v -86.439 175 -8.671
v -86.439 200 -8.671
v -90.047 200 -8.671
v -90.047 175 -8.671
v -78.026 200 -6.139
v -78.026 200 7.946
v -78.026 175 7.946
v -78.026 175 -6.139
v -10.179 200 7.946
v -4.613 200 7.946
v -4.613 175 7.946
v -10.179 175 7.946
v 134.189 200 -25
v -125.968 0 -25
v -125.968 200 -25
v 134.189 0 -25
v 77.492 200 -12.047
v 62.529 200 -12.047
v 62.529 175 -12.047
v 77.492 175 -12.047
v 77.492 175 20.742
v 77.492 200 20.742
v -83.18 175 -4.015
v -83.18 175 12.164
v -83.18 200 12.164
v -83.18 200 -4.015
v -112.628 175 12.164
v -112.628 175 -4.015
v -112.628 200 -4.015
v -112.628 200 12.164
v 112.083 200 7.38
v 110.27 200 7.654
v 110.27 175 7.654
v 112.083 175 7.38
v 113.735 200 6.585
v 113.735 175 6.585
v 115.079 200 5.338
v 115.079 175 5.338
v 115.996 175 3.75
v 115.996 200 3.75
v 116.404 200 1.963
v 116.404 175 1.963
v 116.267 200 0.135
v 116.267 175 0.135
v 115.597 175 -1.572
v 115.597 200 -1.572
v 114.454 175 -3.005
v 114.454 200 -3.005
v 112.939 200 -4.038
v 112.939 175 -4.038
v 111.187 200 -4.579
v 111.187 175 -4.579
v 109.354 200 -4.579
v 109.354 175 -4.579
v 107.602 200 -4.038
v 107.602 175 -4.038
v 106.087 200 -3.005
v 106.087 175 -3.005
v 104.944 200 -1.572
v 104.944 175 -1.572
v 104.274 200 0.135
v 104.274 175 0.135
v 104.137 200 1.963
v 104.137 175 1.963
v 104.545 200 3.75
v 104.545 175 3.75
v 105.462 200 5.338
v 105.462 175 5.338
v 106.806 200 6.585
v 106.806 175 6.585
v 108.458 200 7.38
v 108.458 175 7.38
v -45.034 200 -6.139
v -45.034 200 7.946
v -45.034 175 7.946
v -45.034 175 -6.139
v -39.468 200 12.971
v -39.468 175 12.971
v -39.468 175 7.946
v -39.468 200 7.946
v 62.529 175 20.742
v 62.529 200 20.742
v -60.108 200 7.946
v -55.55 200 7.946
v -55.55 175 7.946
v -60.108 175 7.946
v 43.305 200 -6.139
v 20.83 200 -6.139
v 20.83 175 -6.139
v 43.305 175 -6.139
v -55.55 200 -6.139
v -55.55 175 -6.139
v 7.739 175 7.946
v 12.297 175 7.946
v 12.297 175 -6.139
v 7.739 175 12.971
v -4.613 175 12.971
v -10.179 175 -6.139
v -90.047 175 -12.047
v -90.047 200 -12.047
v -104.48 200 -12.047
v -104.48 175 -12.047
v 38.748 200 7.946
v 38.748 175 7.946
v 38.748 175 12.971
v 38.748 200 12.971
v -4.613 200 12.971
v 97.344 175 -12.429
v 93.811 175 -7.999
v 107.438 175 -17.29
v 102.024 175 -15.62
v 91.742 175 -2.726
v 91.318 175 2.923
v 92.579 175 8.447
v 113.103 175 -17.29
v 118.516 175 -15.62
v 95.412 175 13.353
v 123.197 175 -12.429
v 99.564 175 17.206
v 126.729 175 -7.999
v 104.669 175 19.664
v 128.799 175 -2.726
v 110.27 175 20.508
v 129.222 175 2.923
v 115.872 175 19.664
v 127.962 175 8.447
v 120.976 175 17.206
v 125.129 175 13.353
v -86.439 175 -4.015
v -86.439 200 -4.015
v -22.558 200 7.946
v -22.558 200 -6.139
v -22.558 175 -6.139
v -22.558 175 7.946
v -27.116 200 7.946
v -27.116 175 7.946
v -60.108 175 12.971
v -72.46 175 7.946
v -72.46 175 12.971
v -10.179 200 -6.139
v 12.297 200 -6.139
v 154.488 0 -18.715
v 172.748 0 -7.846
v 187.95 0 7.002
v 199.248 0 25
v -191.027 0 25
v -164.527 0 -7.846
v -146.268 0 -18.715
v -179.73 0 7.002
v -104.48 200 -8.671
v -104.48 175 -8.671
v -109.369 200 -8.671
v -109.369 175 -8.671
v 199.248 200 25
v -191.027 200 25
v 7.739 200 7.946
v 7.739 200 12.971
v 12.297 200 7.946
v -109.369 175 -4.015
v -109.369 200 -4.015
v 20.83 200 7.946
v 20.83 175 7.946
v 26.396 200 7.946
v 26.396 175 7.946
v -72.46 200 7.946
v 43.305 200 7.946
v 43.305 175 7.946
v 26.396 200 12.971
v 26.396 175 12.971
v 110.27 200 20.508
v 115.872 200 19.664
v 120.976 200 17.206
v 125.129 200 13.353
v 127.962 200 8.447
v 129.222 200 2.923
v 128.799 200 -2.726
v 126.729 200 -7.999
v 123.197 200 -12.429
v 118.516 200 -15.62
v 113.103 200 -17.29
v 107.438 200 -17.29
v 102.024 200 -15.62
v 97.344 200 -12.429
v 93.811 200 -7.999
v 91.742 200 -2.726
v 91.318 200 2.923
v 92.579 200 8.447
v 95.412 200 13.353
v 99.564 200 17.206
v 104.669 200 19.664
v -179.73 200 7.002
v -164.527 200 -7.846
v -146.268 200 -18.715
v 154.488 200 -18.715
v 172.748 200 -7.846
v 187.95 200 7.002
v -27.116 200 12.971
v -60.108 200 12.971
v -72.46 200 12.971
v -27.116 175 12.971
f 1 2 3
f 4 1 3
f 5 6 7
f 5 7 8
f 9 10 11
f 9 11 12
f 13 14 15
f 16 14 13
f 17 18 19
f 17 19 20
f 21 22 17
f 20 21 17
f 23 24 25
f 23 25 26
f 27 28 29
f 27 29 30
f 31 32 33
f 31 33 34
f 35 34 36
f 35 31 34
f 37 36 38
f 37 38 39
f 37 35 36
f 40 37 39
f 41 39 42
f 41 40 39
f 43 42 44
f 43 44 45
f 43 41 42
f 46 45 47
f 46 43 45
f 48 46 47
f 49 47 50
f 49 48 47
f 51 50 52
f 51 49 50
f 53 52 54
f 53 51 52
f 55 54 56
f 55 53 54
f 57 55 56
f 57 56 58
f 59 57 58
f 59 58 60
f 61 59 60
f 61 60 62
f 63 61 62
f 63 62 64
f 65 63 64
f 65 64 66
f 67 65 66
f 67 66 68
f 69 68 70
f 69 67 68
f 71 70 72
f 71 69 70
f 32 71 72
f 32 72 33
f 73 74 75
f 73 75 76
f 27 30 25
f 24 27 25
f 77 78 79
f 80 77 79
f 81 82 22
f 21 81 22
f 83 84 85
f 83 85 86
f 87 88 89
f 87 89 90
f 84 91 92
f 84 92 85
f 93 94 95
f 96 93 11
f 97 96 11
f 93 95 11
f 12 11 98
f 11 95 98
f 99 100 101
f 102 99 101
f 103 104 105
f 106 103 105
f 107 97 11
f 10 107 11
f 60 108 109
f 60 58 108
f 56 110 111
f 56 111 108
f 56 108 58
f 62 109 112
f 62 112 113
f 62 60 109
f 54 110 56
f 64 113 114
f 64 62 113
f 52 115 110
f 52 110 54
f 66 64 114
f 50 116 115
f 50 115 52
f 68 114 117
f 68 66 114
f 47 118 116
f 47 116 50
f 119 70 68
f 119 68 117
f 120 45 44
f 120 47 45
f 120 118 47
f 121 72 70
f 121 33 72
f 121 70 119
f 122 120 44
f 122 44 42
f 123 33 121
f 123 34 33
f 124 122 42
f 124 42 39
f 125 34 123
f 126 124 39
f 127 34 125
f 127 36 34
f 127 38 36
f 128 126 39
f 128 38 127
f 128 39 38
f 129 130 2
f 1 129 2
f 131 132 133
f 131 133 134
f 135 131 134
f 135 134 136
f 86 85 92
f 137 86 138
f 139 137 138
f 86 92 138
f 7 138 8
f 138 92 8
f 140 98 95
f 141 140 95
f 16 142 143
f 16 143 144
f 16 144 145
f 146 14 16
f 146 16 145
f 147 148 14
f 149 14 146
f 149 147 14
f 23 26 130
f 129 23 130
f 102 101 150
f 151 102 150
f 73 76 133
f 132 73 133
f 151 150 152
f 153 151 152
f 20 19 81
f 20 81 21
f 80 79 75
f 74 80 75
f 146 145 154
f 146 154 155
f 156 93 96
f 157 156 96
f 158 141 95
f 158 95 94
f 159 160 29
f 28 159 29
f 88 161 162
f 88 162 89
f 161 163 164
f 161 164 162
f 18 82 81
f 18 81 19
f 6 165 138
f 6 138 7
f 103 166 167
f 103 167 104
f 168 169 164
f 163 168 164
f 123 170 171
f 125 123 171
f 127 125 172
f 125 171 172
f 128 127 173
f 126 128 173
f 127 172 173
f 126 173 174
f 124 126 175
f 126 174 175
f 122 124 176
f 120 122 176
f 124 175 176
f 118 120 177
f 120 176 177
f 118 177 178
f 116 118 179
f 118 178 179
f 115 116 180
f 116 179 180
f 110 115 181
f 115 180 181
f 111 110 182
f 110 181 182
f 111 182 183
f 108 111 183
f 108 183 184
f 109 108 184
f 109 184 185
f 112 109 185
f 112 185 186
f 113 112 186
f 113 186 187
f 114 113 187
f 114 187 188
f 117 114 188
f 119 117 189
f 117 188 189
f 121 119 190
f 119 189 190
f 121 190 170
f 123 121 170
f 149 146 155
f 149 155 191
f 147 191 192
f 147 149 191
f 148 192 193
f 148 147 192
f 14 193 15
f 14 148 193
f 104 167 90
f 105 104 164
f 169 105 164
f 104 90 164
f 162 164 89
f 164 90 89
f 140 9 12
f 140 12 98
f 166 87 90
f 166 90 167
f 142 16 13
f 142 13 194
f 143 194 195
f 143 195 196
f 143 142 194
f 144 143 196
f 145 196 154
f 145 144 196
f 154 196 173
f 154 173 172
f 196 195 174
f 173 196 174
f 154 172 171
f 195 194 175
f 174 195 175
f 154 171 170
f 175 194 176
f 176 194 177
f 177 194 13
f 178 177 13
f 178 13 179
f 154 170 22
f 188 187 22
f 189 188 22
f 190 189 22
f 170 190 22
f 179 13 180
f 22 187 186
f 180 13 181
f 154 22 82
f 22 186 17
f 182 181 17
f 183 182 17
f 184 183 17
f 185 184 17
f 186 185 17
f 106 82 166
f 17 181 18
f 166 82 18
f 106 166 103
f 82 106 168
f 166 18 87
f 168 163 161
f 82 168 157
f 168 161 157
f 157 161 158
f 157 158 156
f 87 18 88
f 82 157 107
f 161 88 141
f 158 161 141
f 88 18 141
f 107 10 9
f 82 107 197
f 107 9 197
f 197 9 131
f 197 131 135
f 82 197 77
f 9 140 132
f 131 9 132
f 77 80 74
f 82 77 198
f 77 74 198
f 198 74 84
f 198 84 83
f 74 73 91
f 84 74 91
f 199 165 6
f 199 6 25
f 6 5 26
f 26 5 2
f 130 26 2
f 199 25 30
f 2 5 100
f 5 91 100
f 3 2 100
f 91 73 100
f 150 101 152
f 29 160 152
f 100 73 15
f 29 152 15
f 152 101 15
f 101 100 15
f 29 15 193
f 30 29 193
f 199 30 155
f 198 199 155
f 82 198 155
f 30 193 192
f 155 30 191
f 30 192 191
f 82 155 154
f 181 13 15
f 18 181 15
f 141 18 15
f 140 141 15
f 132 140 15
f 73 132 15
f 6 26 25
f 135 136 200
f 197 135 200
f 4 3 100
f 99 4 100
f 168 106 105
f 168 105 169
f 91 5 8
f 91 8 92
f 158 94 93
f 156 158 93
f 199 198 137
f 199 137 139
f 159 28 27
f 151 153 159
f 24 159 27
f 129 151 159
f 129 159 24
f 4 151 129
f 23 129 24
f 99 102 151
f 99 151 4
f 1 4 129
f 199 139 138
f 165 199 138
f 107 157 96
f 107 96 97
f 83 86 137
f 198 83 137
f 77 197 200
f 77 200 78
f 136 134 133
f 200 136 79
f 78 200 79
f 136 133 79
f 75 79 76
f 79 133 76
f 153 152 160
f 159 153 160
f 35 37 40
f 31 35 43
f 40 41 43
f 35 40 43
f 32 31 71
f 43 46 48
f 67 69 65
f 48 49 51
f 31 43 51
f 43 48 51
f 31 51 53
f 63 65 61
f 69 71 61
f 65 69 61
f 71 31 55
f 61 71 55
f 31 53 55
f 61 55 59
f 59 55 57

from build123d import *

# Parameters (mm, degrees)
BOSS_EXTRUDE1_DEPTH = 200
SKETCH2_R           = 19.005135809
SKETCH2_R_2         = 6.150490934
SKETCH2_W           = 14.963877837
SKETCH2_H           = 32.789303583
CUT_EXTRUDE1_DEPTH  = 25


with BuildPart() as part:
    # Sketch1 → Boss-Extrude1 (new body)
    with BuildSketch(Plane(origin=(0, 0, 0), x_dir=(1, 0, 0), z_dir=(0, 1, 0))):
        with BuildLine():
            Line((199.247825531, -25), (-191.027117423, -25))
            ThreePointArc((-191.027117423, -25), (-164.527287911, 7.845509301), (-125.968347388, 25))
            Line((-125.968347388, 25), (134.189055496, 25))
            ThreePointArc((134.189055496, 25), (172.747996019, 7.845509301), (199.247825531, -25))
        make_face()
    extrude(amount=BOSS_EXTRUDE1_DEPTH)

    # Sketch2 → Cut-Extrude1 (cut)
    # profile 1 of 7: a face of its own
    with BuildSketch(Plane(origin=(0, 200, 0), x_dir=(1, 0, 0), z_dir=(0, 1, 0))):
        with Locations(Location((110.270417857, -1.503200416, 0), (0, 0, 270))):
            Circle(SKETCH2_R)
        with Locations(Location((110.270417857, -1.503200416, 0), (0, 0, 270))):
            Circle(SKETCH2_R_2, mode=Mode.SUBTRACT)
    # profile 2 of 7: a face of its own
    with BuildSketch(Plane(origin=(0, 200, 0), x_dir=(1, 0, 0), z_dir=(0, 1, 0))):
        Polygon((-72.460343133, -7.946264371), (-78.025852291, -7.946264371), (-78.025852291, 6.139420836), (-55.550414196, 6.139420836), (-55.550414196, -7.946264371), (-60.107751805, -7.946264371), (-60.107751805, -12.97071102), (-72.460343133, -12.97071102), align=None)
    # profile 3 of 7: a face of its own
    with BuildSketch(Plane(origin=(0, 200, 0), x_dir=(1, 0, 0), z_dir=(0, 1, 0))):
        Polygon((-39.468323041, -7.946264371), (-45.033832199, -7.946264371), (-45.033832199, 6.139420836), (-22.558394104, 6.139420836), (-22.558394104, -7.946264371), (-27.115731714, -7.946264371), (-27.115731714, -12.97071102), (-39.468323041, -12.97071102), align=None)
    # profile 4 of 7: a face of its own
    with BuildSketch(Plane(origin=(0, 200, 0), x_dir=(1, 0, 0), z_dir=(0, 1, 0))):
        Polygon((-4.613365568, -7.946264371), (-10.178874726, -7.946264371), (-10.178874726, 6.139420836), (12.296563369, 6.139420836), (12.296563369, -7.946264371), (7.739225759, -7.946264371), (7.739225759, -12.97071102), (-4.613365568, -12.97071102), align=None)
    # profile 5 of 7: a face of its own
    with BuildSketch(Plane(origin=(0, 200, 0), x_dir=(1, 0, 0), z_dir=(0, 1, 0))):
        Polygon((26.395527633, -7.946264371), (20.830018475, -7.946264371), (20.830018475, 6.139420836), (43.30545657, 6.139420836), (43.30545657, -7.946264371), (38.74811896, -7.946264371), (38.74811896, -12.97071102), (26.395527633, -12.97071102), align=None)
    # profile 6 of 7: a face of its own
    with BuildSketch(Plane(origin=(0, 200, 0), x_dir=(1, 0, 0), z_dir=(0, 1, 0))):
        Polygon((-83.179668167, -12.163715332), (-83.179668167, 4.015448284), (-86.438780262, 4.015448284), (-86.438780262, 8.671322706), (-90.047082939, 8.671322706), (-90.047082939, 12.046831662), (-104.480293646, 12.046831662), (-104.480293646, 8.671322706), (-109.368961789, 8.671322706), (-109.368961789, 4.015448284), (-112.628073884, 4.015448284), (-112.628073884, -12.163715332), align=None)
    # profile 7 of 7: a face of its own
    with BuildSketch(Plane(origin=(0, 200, 0), x_dir=(1, 0, 0), z_dir=(0, 1, 0))):
        with Locations((70.010460819, -4.347820129)):
            Rectangle(SKETCH2_W, SKETCH2_H)
    extrude(amount=-CUT_EXTRUDE1_DEPTH, mode=Mode.SUBTRACT)


solid = part.part
